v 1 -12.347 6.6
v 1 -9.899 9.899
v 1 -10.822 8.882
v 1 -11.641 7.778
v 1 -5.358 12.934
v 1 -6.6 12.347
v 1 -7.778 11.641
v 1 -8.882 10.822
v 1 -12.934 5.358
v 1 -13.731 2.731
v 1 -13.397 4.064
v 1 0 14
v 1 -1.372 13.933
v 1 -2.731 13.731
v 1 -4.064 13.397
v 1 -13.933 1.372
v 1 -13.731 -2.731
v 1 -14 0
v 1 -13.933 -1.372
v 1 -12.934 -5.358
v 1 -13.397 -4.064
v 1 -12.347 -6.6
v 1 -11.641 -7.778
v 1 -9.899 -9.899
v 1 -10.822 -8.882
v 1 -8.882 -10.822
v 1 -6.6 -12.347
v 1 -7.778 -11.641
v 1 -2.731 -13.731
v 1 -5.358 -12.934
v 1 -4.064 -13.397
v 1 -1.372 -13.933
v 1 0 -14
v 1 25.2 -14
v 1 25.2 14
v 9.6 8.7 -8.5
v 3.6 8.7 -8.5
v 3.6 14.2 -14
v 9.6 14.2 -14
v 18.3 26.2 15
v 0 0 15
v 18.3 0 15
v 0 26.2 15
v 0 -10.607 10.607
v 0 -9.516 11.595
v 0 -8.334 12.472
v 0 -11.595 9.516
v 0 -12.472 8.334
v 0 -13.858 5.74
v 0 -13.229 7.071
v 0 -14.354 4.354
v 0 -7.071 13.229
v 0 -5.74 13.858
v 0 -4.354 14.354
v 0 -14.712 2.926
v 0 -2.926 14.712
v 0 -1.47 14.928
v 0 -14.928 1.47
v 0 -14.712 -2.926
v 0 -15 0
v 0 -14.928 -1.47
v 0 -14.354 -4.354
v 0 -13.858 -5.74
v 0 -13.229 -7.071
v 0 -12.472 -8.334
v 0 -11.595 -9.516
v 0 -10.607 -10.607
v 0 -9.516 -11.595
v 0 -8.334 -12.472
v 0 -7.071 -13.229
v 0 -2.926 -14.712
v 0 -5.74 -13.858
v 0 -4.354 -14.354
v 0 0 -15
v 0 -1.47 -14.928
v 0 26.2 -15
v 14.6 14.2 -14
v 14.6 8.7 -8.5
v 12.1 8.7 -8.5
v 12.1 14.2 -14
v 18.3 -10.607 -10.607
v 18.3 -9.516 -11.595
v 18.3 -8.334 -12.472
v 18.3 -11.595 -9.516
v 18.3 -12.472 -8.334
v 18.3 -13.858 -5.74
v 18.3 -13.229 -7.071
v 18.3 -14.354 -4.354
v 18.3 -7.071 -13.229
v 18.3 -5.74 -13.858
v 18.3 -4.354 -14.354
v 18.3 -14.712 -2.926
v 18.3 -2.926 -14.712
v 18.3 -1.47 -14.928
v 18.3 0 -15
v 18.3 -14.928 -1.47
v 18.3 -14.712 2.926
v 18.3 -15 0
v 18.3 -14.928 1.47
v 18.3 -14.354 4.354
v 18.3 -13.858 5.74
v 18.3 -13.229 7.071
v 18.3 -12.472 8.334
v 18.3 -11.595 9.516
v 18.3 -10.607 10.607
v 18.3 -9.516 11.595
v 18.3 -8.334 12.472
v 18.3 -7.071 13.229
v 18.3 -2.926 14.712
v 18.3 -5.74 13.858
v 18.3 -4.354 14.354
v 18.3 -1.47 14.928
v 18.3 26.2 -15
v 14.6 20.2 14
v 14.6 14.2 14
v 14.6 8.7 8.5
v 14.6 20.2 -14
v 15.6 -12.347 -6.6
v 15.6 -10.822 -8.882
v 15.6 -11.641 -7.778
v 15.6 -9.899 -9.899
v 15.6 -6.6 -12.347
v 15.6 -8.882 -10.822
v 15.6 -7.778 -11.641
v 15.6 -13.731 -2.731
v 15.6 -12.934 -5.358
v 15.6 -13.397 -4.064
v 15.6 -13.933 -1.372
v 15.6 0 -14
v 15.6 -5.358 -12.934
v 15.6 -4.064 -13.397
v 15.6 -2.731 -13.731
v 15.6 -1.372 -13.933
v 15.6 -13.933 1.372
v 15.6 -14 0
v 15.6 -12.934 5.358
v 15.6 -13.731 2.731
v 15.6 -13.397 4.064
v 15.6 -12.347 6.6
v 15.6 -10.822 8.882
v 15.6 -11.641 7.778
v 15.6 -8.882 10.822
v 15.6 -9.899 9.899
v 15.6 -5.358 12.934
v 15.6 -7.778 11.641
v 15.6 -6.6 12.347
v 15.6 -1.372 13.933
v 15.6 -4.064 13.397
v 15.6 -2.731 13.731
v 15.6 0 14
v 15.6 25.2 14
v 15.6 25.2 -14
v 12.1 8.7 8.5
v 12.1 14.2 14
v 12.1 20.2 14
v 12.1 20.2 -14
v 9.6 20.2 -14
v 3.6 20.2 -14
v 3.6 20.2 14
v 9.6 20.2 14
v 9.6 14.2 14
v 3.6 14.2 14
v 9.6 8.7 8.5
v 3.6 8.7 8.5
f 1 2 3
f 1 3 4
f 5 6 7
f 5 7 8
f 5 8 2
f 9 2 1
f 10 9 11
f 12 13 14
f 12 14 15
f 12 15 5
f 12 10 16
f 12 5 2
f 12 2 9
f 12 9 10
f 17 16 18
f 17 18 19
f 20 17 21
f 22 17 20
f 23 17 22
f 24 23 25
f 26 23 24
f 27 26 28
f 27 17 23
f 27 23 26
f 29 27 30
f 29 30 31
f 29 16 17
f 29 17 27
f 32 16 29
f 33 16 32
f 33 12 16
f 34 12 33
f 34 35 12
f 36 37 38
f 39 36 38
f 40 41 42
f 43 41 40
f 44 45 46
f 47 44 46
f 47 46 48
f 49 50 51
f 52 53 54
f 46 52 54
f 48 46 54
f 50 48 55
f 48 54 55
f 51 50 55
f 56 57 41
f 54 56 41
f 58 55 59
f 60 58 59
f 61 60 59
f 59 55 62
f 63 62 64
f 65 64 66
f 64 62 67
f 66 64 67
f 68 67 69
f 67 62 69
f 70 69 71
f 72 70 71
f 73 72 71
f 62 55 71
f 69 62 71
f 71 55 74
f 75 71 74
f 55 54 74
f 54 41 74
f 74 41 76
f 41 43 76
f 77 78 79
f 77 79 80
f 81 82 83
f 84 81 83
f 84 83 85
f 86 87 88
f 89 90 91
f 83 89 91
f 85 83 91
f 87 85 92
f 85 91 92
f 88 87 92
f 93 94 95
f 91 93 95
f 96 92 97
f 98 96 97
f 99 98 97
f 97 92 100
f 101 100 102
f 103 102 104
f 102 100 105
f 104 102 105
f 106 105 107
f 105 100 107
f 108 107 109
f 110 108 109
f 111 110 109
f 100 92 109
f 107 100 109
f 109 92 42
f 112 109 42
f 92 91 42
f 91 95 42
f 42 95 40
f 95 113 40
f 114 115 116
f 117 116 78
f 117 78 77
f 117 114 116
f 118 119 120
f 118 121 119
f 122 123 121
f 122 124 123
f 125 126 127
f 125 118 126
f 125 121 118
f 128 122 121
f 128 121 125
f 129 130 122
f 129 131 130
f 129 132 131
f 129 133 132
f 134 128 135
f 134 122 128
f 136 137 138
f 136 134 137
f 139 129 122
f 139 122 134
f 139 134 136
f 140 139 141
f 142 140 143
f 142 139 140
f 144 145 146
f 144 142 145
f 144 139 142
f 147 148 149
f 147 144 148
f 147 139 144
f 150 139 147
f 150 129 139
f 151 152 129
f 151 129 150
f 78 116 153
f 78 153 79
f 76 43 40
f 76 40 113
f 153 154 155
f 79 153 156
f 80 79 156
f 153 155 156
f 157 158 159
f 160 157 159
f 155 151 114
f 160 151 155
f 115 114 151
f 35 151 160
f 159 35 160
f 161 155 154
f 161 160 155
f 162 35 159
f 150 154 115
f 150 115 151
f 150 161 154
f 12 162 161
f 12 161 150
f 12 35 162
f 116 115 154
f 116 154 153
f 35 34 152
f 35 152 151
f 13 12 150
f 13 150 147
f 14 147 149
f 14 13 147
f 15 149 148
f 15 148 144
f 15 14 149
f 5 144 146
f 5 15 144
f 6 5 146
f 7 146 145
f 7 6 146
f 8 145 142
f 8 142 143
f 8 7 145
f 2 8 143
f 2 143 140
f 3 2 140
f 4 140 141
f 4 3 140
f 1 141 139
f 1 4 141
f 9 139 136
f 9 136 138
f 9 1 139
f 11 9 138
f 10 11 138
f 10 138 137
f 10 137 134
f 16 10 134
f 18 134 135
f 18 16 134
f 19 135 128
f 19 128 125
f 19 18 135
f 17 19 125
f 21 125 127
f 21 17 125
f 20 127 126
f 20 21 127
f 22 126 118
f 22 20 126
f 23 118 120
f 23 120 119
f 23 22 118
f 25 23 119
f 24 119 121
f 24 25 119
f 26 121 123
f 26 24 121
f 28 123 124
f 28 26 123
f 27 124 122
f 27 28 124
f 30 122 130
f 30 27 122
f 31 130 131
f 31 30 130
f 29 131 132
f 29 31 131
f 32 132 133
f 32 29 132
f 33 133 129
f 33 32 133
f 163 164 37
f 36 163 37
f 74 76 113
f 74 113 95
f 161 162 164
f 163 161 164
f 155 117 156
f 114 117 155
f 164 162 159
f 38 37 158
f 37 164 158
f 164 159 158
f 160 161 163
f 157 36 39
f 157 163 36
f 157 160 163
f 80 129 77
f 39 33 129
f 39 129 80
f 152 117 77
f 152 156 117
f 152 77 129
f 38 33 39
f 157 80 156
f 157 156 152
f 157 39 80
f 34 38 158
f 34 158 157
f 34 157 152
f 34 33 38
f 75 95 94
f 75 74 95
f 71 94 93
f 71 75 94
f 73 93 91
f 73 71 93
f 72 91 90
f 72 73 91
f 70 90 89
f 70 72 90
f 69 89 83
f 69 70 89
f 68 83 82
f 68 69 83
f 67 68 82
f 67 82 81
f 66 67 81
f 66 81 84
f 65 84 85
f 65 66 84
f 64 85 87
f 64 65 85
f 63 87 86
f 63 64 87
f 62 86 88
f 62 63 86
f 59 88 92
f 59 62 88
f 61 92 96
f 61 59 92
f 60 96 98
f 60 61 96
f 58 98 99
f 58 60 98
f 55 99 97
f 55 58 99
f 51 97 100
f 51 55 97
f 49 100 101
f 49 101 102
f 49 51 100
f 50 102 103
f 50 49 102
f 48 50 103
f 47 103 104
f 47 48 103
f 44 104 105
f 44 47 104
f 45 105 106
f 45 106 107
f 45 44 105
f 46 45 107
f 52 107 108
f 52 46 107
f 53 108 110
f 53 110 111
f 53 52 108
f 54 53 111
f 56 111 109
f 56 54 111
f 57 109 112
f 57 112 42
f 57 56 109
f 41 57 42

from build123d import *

# Parameters (mm, degrees)
EXTRUDE_1_DEPTH = 1
EXTRUDE_2_DEPTH = 14.6
EXTRUDE_3_DEPTH = 6
EXTRUDE_4_DEPTH = 2.5
EXTRUDE_6_DEPTH = 2.7


with BuildPart() as part:
    # 草图1 → 凸台-拉伸1 (new body)
    with BuildSketch(Plane(origin=(0, 0, 0), x_dir=(0, 0, -1), z_dir=(1, 0, 0))):
        with BuildLine():
            Line((15, 0), (15, 26.2))
            Line((15, 26.2), (-15, 26.2))
            Line((-15, 26.2), (-15, 0))
            ThreePointArc((-15, 0), (0, -15), (15, 0))
        make_face()
    extrude(amount=EXTRUDE_1_DEPTH)

    # 草图2 → 凸台-拉伸2 (add)
    with BuildSketch(Plane(origin=(1, 0, 0), x_dir=(0, 0, -1), z_dir=(1, 0, 0))):
        with BuildLine():
            Line((15, 0), (15, 26.2))
            Line((15, 26.2), (-15, 26.2))
            Line((-15, 26.2), (-15, 0))
            ThreePointArc((-15, 0), (0, -15), (15, 0))
        make_face()
        with BuildLine():
            Line((14, 0), (14, 25.2))
            Line((14, 25.2), (-14, 25.2))
            Line((-14, 25.2), (-14, 0))
            ThreePointArc((-14, 0), (0, -14), (14, 0))
        make_face(mode=Mode.SUBTRACT)
    extrude(amount=EXTRUDE_2_DEPTH)

    # 草图4 → 凸台-拉伸3 (add)
    with BuildSketch(Plane(origin=(3.6, 0, 0), x_dir=(0, 0, -1), z_dir=(1, 0, 0))):
        Polygon((8.5, 8.7), (14, 14.2), (14, 20.2), (-14, 20.2), (-14, 14.2), (-8.5, 8.7), align=None)
    extrude(amount=EXTRUDE_3_DEPTH)

    # 草图5 → 凸台-拉伸4 (add)
    with BuildSketch(Plane(origin=(14.6, 0, 0), x_dir=(0, 0, -1), z_dir=(1, 0, 0))):
        Polygon((14, 14.2), (14, 20.2), (-14, 20.2), (-14, 14.2), (-8.5, 8.7), (8.5, 8.7), align=None)
    extrude(amount=-EXTRUDE_4_DEPTH)

    # 草图6 → 凸台-拉伸6 (add)
    with BuildSketch(Plane(origin=(15.6, 0, 0), x_dir=(0, 0, -1), z_dir=(1, 0, 0))):
        with BuildLine():
            Line((-15, 0), (-15, 26.2))
            Line((-15, 26.2), (15, 26.2))
            Line((15, 26.2), (15, 0))
            ThreePointArc((15, 0), (0, -15), (-15, 0))
        make_face()
    extrude(amount=EXTRUDE_6_DEPTH)


solid = part.part
